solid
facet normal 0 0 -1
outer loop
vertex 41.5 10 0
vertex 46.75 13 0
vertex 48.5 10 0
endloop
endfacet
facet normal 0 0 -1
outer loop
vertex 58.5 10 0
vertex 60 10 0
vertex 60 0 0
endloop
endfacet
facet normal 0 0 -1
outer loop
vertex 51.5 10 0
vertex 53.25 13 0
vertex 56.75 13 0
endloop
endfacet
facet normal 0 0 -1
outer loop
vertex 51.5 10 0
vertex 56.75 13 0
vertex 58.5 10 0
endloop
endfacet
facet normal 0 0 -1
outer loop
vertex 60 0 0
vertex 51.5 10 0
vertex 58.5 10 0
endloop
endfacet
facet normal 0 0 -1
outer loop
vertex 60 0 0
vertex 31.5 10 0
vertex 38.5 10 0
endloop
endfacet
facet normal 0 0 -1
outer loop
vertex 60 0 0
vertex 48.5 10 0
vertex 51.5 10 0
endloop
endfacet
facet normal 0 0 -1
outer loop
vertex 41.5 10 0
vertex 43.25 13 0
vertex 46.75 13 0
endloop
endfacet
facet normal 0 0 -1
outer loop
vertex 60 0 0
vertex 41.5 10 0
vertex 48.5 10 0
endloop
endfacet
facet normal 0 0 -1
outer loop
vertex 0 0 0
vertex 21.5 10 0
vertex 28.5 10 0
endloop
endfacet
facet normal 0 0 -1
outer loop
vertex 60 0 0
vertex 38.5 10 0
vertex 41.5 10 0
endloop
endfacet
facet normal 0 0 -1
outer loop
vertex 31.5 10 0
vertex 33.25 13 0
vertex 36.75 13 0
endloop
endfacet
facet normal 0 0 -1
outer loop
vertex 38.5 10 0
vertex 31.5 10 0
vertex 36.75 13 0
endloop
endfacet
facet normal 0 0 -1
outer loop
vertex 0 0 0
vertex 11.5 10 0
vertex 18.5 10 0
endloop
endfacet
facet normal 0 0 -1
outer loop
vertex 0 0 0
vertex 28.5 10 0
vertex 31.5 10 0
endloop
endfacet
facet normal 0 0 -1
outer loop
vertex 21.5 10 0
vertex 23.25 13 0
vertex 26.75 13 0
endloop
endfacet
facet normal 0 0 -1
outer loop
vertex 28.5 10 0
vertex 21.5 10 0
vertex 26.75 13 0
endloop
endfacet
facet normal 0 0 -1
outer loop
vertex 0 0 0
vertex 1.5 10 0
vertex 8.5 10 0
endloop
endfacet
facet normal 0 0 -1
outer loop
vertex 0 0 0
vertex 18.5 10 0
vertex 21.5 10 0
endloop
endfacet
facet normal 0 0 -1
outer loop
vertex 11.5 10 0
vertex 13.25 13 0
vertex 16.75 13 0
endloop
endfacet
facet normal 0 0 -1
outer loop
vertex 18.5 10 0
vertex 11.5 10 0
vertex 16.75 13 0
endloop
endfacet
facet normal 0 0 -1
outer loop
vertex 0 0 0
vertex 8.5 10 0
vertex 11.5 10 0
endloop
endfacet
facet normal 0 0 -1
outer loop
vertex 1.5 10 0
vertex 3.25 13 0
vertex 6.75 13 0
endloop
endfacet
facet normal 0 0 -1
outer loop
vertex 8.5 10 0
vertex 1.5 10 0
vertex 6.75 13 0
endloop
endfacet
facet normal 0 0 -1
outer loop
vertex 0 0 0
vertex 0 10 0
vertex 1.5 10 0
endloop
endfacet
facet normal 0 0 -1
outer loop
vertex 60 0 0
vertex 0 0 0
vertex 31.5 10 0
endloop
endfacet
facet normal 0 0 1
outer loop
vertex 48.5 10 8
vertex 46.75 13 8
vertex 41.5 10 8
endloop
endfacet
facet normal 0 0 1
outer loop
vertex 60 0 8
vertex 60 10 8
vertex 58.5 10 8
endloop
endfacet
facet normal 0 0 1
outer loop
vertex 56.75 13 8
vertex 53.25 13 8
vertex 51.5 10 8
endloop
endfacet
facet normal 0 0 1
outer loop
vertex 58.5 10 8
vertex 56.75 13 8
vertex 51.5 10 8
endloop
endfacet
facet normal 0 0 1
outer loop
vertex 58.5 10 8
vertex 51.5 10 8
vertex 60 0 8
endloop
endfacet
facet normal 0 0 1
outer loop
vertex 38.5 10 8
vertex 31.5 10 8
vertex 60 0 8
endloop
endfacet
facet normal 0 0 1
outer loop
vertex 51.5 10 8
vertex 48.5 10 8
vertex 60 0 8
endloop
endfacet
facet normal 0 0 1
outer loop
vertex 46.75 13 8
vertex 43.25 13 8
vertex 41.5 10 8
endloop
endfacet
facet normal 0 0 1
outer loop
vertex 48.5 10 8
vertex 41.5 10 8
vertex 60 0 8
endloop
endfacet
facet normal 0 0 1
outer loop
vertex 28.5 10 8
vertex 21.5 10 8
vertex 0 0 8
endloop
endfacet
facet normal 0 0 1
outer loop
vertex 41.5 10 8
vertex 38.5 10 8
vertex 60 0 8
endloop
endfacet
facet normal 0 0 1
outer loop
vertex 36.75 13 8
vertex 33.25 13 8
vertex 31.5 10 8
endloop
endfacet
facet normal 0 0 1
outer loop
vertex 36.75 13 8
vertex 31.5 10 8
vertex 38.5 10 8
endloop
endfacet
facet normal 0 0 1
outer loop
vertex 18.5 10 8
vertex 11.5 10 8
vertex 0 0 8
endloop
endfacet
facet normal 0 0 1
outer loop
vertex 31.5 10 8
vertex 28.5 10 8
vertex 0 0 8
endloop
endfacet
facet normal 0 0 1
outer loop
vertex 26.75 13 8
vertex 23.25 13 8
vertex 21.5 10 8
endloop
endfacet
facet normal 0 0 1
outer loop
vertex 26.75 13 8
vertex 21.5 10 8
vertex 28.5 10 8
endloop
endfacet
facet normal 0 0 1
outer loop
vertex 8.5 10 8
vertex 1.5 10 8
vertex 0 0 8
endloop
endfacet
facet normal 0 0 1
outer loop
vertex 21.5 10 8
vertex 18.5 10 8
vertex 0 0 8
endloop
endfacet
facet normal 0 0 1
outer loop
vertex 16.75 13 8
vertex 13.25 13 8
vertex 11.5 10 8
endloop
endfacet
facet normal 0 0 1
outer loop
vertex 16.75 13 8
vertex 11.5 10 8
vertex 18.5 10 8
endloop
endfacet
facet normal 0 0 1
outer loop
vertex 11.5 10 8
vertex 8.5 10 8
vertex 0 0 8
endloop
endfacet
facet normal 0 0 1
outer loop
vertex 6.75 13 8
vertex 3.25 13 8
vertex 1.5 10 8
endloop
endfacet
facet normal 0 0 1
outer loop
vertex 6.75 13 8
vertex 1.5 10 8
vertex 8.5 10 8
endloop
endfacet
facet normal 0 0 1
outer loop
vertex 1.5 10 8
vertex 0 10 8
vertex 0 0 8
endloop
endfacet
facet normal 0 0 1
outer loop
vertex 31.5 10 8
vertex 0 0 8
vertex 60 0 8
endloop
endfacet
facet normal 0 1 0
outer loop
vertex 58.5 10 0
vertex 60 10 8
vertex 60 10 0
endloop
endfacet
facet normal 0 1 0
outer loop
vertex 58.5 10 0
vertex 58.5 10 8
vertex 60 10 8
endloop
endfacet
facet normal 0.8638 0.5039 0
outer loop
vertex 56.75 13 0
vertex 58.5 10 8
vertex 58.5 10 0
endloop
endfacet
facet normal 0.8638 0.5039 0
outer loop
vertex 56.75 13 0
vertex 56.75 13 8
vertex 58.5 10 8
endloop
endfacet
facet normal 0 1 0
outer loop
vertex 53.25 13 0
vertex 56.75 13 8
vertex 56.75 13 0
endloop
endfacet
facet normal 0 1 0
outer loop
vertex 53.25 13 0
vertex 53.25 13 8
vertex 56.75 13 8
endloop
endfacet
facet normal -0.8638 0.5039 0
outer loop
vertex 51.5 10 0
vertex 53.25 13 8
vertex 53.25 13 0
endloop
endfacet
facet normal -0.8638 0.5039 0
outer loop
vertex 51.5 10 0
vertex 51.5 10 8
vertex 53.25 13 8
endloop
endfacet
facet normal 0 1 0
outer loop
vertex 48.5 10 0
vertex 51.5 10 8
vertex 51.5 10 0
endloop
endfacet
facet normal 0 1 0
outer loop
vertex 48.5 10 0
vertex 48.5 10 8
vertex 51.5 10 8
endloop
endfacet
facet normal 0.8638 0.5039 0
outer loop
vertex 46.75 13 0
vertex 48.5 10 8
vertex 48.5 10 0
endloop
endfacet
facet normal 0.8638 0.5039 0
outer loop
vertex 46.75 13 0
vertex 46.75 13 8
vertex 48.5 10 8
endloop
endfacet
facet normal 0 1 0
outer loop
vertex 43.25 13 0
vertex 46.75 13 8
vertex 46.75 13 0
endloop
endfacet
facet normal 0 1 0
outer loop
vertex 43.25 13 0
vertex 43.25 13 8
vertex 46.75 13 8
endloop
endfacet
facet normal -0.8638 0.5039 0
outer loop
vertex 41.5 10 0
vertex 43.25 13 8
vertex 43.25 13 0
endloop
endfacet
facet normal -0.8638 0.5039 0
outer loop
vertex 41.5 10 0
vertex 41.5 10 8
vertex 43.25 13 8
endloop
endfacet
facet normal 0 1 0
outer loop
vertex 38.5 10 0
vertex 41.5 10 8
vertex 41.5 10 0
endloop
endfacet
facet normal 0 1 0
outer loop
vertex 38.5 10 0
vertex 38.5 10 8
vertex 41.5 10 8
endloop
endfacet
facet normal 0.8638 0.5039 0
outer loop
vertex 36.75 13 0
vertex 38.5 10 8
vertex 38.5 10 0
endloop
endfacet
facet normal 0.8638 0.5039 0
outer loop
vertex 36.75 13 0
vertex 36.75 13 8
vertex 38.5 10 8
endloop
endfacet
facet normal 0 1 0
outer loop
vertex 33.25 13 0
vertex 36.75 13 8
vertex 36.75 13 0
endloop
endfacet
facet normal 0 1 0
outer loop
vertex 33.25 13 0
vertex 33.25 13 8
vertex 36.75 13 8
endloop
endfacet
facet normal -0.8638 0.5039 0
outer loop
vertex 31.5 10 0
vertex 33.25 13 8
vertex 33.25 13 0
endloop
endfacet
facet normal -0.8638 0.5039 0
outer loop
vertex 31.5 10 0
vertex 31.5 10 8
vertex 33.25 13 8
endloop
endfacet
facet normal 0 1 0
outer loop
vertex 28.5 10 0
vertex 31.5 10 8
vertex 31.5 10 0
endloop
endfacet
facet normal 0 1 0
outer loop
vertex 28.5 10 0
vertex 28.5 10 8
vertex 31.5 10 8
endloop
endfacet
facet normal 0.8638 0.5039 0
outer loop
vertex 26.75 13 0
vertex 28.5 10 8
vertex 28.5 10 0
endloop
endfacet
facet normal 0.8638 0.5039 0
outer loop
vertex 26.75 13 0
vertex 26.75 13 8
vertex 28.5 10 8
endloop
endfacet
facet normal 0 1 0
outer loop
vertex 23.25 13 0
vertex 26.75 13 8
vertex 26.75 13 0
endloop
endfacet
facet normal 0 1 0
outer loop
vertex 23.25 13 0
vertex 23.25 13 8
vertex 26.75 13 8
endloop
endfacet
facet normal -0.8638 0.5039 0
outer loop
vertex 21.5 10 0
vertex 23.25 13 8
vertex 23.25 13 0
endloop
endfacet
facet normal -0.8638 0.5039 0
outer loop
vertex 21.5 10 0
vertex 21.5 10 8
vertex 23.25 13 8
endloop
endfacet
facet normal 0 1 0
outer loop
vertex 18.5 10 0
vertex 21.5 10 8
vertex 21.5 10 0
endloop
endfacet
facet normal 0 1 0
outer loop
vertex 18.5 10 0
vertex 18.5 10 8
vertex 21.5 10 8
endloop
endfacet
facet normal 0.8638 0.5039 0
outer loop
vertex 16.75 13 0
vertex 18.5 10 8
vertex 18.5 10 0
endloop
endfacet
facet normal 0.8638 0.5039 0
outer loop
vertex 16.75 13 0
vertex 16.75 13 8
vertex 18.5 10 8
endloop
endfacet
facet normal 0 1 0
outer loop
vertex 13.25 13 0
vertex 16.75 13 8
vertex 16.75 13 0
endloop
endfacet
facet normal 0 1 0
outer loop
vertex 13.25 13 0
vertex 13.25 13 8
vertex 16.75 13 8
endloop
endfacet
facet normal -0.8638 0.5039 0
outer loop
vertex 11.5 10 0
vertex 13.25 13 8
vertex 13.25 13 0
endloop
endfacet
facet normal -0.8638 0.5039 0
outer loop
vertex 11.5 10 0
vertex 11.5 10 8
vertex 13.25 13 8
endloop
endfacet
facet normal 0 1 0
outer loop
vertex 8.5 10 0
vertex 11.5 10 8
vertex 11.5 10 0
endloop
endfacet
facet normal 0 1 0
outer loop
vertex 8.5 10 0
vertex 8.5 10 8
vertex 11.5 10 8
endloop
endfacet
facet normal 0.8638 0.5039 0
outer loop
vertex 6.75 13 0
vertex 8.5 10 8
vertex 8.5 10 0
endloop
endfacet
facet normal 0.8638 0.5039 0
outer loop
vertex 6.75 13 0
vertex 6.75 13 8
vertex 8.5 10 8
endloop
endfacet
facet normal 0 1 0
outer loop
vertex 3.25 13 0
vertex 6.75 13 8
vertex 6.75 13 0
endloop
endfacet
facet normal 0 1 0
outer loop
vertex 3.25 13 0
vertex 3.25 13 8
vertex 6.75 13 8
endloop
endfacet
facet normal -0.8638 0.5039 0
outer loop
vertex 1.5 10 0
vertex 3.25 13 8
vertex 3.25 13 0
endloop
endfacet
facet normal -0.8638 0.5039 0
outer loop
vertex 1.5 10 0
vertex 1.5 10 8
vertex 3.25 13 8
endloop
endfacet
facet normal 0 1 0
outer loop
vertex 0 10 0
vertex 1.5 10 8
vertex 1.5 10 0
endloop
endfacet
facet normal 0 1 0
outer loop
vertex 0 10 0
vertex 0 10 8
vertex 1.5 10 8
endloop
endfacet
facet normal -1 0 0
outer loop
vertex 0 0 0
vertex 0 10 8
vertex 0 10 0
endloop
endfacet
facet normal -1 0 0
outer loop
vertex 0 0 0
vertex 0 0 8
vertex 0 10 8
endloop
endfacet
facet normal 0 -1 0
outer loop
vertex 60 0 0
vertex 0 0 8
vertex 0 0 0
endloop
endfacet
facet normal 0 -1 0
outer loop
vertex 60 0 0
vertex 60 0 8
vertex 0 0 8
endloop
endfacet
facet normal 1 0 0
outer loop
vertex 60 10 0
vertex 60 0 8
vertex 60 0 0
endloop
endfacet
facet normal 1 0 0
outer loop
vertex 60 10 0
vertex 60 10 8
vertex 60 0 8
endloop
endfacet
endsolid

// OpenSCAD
$fn = 32;

// ----------------------------------------------------------------------
// Gear rack: 6 teeth, pitch 10 mm
// ----------------------------------------------------------------------

// --- parameters (mm) ---
teeth = 6;                // number of teeth
pitch = 10;               // tooth pitch, X
root_w = 7;               // tooth width at the root
tip_w = 3.5;              // tooth width at the tip
base_h = 10;              // rack body height, Y
tooth_h = 3;              // tooth height above the body
plate_t = 8;              // rack width, Z (extrusion height)

rack_l = teeth * pitch;  // overall length
total_h = base_h + tooth_h;  // overall height

profile = [[0, 0], [60, 0], [60, 10], [58.5, 10], [56.75, 13], [53.25, 13], [51.5, 10], [48.5, 10], [46.75, 13], [43.25, 13], [41.5, 10], [38.5, 10], [36.75, 13], [33.25, 13], [31.5, 10], [28.5, 10], [26.75, 13], [23.25, 13], [21.5, 10], [18.5, 10], [16.75, 13], [13.25, 13], [11.5, 10], [8.5, 10], [6.75, 13], [3.25, 13], [1.5, 10], [0, 10]];  // primary outline, 28 points, counter clockwise

// --- the one profile operation ---
linear_extrude(height = plate_t) polygon(points = profile);
